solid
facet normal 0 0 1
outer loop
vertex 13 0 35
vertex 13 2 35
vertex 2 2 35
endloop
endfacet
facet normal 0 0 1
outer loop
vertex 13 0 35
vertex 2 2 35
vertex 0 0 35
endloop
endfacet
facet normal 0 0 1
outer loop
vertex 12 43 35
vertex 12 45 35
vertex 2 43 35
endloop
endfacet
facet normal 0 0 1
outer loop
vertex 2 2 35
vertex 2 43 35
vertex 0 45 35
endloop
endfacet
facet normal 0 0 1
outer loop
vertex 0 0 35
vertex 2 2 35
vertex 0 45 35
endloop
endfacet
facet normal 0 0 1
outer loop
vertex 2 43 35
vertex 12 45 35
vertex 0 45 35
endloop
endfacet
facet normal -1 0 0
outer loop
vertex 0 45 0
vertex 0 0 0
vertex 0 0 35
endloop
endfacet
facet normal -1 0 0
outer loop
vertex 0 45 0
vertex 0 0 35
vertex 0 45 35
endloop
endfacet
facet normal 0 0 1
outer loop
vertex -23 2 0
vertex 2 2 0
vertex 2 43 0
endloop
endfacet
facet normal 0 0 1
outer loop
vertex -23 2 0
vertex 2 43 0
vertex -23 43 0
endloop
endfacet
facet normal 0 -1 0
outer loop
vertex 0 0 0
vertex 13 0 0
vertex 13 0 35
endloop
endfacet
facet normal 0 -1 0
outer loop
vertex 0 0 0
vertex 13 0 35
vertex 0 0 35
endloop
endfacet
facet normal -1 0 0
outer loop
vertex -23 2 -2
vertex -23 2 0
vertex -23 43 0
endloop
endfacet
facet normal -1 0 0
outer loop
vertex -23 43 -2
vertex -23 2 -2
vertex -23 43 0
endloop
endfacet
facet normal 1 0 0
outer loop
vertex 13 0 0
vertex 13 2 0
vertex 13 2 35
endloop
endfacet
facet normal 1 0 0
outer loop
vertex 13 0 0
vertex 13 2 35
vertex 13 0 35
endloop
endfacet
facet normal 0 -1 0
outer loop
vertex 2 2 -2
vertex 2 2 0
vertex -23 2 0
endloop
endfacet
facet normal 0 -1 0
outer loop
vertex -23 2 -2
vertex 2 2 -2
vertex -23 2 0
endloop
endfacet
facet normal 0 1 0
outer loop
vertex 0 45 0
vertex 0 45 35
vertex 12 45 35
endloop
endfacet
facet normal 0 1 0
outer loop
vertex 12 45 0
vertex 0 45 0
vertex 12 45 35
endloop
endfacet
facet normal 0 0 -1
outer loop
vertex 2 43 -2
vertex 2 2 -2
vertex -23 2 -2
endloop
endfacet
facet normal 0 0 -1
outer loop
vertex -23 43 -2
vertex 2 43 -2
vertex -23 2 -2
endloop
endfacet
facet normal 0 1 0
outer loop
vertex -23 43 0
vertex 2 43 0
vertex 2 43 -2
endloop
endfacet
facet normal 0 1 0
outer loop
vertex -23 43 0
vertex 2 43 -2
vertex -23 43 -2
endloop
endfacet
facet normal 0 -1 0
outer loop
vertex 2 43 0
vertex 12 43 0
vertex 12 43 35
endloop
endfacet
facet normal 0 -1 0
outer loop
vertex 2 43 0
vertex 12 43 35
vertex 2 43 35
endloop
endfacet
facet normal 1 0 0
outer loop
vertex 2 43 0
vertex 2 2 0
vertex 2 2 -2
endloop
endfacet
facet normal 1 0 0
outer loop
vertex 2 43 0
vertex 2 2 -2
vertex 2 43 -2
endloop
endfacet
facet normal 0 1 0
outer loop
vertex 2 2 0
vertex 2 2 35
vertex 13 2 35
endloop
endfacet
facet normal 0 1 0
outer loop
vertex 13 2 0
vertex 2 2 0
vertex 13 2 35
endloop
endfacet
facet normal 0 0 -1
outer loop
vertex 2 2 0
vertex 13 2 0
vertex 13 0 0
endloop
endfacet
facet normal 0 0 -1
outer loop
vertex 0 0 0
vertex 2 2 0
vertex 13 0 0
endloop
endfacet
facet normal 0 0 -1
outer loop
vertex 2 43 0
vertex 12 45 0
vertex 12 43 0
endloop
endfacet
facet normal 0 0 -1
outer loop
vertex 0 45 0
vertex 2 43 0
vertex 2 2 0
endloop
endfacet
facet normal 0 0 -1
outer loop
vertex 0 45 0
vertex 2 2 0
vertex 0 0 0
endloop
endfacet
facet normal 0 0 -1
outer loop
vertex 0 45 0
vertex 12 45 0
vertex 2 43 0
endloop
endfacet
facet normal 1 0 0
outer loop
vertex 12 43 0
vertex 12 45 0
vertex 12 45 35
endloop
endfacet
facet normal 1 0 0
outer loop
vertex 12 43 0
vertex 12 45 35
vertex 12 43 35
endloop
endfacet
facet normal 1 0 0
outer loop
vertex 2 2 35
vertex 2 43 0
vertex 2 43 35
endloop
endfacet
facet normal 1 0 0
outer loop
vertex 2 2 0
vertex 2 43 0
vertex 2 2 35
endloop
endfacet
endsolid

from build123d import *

# Parameters (mm, degrees)
BOSS_EXTRUDE1_DEPTH = 35
SKETCH2_W           = 25
SKETCH2_H           = 41
BOSS_EXTRUDE2_DEPTH = 2


with BuildPart() as part:
    # Sketch1 → Boss-Extrude1 (new body)
    with BuildSketch(Plane.XY):
        Polygon((0, 0), (0, 45), (12, 45), (12, 43), (2, 43), (2, 2), (13, 2), (13, 0), align=None)
    extrude(amount=BOSS_EXTRUDE1_DEPTH)


with BuildPart() as body_2:
    # Sketch2 → Boss-Extrude2 (new body)
    with BuildSketch(Plane(origin=(0, 0, 0), x_dir=(-1, 0, 0), z_dir=(0, 0, -1))):
        with Locations((10.5, 22.5)):
            Rectangle(SKETCH2_W, SKETCH2_H)
    extrude(amount=BOSS_EXTRUDE2_DEPTH)


solid = Compound([part.part, body_2.part])
